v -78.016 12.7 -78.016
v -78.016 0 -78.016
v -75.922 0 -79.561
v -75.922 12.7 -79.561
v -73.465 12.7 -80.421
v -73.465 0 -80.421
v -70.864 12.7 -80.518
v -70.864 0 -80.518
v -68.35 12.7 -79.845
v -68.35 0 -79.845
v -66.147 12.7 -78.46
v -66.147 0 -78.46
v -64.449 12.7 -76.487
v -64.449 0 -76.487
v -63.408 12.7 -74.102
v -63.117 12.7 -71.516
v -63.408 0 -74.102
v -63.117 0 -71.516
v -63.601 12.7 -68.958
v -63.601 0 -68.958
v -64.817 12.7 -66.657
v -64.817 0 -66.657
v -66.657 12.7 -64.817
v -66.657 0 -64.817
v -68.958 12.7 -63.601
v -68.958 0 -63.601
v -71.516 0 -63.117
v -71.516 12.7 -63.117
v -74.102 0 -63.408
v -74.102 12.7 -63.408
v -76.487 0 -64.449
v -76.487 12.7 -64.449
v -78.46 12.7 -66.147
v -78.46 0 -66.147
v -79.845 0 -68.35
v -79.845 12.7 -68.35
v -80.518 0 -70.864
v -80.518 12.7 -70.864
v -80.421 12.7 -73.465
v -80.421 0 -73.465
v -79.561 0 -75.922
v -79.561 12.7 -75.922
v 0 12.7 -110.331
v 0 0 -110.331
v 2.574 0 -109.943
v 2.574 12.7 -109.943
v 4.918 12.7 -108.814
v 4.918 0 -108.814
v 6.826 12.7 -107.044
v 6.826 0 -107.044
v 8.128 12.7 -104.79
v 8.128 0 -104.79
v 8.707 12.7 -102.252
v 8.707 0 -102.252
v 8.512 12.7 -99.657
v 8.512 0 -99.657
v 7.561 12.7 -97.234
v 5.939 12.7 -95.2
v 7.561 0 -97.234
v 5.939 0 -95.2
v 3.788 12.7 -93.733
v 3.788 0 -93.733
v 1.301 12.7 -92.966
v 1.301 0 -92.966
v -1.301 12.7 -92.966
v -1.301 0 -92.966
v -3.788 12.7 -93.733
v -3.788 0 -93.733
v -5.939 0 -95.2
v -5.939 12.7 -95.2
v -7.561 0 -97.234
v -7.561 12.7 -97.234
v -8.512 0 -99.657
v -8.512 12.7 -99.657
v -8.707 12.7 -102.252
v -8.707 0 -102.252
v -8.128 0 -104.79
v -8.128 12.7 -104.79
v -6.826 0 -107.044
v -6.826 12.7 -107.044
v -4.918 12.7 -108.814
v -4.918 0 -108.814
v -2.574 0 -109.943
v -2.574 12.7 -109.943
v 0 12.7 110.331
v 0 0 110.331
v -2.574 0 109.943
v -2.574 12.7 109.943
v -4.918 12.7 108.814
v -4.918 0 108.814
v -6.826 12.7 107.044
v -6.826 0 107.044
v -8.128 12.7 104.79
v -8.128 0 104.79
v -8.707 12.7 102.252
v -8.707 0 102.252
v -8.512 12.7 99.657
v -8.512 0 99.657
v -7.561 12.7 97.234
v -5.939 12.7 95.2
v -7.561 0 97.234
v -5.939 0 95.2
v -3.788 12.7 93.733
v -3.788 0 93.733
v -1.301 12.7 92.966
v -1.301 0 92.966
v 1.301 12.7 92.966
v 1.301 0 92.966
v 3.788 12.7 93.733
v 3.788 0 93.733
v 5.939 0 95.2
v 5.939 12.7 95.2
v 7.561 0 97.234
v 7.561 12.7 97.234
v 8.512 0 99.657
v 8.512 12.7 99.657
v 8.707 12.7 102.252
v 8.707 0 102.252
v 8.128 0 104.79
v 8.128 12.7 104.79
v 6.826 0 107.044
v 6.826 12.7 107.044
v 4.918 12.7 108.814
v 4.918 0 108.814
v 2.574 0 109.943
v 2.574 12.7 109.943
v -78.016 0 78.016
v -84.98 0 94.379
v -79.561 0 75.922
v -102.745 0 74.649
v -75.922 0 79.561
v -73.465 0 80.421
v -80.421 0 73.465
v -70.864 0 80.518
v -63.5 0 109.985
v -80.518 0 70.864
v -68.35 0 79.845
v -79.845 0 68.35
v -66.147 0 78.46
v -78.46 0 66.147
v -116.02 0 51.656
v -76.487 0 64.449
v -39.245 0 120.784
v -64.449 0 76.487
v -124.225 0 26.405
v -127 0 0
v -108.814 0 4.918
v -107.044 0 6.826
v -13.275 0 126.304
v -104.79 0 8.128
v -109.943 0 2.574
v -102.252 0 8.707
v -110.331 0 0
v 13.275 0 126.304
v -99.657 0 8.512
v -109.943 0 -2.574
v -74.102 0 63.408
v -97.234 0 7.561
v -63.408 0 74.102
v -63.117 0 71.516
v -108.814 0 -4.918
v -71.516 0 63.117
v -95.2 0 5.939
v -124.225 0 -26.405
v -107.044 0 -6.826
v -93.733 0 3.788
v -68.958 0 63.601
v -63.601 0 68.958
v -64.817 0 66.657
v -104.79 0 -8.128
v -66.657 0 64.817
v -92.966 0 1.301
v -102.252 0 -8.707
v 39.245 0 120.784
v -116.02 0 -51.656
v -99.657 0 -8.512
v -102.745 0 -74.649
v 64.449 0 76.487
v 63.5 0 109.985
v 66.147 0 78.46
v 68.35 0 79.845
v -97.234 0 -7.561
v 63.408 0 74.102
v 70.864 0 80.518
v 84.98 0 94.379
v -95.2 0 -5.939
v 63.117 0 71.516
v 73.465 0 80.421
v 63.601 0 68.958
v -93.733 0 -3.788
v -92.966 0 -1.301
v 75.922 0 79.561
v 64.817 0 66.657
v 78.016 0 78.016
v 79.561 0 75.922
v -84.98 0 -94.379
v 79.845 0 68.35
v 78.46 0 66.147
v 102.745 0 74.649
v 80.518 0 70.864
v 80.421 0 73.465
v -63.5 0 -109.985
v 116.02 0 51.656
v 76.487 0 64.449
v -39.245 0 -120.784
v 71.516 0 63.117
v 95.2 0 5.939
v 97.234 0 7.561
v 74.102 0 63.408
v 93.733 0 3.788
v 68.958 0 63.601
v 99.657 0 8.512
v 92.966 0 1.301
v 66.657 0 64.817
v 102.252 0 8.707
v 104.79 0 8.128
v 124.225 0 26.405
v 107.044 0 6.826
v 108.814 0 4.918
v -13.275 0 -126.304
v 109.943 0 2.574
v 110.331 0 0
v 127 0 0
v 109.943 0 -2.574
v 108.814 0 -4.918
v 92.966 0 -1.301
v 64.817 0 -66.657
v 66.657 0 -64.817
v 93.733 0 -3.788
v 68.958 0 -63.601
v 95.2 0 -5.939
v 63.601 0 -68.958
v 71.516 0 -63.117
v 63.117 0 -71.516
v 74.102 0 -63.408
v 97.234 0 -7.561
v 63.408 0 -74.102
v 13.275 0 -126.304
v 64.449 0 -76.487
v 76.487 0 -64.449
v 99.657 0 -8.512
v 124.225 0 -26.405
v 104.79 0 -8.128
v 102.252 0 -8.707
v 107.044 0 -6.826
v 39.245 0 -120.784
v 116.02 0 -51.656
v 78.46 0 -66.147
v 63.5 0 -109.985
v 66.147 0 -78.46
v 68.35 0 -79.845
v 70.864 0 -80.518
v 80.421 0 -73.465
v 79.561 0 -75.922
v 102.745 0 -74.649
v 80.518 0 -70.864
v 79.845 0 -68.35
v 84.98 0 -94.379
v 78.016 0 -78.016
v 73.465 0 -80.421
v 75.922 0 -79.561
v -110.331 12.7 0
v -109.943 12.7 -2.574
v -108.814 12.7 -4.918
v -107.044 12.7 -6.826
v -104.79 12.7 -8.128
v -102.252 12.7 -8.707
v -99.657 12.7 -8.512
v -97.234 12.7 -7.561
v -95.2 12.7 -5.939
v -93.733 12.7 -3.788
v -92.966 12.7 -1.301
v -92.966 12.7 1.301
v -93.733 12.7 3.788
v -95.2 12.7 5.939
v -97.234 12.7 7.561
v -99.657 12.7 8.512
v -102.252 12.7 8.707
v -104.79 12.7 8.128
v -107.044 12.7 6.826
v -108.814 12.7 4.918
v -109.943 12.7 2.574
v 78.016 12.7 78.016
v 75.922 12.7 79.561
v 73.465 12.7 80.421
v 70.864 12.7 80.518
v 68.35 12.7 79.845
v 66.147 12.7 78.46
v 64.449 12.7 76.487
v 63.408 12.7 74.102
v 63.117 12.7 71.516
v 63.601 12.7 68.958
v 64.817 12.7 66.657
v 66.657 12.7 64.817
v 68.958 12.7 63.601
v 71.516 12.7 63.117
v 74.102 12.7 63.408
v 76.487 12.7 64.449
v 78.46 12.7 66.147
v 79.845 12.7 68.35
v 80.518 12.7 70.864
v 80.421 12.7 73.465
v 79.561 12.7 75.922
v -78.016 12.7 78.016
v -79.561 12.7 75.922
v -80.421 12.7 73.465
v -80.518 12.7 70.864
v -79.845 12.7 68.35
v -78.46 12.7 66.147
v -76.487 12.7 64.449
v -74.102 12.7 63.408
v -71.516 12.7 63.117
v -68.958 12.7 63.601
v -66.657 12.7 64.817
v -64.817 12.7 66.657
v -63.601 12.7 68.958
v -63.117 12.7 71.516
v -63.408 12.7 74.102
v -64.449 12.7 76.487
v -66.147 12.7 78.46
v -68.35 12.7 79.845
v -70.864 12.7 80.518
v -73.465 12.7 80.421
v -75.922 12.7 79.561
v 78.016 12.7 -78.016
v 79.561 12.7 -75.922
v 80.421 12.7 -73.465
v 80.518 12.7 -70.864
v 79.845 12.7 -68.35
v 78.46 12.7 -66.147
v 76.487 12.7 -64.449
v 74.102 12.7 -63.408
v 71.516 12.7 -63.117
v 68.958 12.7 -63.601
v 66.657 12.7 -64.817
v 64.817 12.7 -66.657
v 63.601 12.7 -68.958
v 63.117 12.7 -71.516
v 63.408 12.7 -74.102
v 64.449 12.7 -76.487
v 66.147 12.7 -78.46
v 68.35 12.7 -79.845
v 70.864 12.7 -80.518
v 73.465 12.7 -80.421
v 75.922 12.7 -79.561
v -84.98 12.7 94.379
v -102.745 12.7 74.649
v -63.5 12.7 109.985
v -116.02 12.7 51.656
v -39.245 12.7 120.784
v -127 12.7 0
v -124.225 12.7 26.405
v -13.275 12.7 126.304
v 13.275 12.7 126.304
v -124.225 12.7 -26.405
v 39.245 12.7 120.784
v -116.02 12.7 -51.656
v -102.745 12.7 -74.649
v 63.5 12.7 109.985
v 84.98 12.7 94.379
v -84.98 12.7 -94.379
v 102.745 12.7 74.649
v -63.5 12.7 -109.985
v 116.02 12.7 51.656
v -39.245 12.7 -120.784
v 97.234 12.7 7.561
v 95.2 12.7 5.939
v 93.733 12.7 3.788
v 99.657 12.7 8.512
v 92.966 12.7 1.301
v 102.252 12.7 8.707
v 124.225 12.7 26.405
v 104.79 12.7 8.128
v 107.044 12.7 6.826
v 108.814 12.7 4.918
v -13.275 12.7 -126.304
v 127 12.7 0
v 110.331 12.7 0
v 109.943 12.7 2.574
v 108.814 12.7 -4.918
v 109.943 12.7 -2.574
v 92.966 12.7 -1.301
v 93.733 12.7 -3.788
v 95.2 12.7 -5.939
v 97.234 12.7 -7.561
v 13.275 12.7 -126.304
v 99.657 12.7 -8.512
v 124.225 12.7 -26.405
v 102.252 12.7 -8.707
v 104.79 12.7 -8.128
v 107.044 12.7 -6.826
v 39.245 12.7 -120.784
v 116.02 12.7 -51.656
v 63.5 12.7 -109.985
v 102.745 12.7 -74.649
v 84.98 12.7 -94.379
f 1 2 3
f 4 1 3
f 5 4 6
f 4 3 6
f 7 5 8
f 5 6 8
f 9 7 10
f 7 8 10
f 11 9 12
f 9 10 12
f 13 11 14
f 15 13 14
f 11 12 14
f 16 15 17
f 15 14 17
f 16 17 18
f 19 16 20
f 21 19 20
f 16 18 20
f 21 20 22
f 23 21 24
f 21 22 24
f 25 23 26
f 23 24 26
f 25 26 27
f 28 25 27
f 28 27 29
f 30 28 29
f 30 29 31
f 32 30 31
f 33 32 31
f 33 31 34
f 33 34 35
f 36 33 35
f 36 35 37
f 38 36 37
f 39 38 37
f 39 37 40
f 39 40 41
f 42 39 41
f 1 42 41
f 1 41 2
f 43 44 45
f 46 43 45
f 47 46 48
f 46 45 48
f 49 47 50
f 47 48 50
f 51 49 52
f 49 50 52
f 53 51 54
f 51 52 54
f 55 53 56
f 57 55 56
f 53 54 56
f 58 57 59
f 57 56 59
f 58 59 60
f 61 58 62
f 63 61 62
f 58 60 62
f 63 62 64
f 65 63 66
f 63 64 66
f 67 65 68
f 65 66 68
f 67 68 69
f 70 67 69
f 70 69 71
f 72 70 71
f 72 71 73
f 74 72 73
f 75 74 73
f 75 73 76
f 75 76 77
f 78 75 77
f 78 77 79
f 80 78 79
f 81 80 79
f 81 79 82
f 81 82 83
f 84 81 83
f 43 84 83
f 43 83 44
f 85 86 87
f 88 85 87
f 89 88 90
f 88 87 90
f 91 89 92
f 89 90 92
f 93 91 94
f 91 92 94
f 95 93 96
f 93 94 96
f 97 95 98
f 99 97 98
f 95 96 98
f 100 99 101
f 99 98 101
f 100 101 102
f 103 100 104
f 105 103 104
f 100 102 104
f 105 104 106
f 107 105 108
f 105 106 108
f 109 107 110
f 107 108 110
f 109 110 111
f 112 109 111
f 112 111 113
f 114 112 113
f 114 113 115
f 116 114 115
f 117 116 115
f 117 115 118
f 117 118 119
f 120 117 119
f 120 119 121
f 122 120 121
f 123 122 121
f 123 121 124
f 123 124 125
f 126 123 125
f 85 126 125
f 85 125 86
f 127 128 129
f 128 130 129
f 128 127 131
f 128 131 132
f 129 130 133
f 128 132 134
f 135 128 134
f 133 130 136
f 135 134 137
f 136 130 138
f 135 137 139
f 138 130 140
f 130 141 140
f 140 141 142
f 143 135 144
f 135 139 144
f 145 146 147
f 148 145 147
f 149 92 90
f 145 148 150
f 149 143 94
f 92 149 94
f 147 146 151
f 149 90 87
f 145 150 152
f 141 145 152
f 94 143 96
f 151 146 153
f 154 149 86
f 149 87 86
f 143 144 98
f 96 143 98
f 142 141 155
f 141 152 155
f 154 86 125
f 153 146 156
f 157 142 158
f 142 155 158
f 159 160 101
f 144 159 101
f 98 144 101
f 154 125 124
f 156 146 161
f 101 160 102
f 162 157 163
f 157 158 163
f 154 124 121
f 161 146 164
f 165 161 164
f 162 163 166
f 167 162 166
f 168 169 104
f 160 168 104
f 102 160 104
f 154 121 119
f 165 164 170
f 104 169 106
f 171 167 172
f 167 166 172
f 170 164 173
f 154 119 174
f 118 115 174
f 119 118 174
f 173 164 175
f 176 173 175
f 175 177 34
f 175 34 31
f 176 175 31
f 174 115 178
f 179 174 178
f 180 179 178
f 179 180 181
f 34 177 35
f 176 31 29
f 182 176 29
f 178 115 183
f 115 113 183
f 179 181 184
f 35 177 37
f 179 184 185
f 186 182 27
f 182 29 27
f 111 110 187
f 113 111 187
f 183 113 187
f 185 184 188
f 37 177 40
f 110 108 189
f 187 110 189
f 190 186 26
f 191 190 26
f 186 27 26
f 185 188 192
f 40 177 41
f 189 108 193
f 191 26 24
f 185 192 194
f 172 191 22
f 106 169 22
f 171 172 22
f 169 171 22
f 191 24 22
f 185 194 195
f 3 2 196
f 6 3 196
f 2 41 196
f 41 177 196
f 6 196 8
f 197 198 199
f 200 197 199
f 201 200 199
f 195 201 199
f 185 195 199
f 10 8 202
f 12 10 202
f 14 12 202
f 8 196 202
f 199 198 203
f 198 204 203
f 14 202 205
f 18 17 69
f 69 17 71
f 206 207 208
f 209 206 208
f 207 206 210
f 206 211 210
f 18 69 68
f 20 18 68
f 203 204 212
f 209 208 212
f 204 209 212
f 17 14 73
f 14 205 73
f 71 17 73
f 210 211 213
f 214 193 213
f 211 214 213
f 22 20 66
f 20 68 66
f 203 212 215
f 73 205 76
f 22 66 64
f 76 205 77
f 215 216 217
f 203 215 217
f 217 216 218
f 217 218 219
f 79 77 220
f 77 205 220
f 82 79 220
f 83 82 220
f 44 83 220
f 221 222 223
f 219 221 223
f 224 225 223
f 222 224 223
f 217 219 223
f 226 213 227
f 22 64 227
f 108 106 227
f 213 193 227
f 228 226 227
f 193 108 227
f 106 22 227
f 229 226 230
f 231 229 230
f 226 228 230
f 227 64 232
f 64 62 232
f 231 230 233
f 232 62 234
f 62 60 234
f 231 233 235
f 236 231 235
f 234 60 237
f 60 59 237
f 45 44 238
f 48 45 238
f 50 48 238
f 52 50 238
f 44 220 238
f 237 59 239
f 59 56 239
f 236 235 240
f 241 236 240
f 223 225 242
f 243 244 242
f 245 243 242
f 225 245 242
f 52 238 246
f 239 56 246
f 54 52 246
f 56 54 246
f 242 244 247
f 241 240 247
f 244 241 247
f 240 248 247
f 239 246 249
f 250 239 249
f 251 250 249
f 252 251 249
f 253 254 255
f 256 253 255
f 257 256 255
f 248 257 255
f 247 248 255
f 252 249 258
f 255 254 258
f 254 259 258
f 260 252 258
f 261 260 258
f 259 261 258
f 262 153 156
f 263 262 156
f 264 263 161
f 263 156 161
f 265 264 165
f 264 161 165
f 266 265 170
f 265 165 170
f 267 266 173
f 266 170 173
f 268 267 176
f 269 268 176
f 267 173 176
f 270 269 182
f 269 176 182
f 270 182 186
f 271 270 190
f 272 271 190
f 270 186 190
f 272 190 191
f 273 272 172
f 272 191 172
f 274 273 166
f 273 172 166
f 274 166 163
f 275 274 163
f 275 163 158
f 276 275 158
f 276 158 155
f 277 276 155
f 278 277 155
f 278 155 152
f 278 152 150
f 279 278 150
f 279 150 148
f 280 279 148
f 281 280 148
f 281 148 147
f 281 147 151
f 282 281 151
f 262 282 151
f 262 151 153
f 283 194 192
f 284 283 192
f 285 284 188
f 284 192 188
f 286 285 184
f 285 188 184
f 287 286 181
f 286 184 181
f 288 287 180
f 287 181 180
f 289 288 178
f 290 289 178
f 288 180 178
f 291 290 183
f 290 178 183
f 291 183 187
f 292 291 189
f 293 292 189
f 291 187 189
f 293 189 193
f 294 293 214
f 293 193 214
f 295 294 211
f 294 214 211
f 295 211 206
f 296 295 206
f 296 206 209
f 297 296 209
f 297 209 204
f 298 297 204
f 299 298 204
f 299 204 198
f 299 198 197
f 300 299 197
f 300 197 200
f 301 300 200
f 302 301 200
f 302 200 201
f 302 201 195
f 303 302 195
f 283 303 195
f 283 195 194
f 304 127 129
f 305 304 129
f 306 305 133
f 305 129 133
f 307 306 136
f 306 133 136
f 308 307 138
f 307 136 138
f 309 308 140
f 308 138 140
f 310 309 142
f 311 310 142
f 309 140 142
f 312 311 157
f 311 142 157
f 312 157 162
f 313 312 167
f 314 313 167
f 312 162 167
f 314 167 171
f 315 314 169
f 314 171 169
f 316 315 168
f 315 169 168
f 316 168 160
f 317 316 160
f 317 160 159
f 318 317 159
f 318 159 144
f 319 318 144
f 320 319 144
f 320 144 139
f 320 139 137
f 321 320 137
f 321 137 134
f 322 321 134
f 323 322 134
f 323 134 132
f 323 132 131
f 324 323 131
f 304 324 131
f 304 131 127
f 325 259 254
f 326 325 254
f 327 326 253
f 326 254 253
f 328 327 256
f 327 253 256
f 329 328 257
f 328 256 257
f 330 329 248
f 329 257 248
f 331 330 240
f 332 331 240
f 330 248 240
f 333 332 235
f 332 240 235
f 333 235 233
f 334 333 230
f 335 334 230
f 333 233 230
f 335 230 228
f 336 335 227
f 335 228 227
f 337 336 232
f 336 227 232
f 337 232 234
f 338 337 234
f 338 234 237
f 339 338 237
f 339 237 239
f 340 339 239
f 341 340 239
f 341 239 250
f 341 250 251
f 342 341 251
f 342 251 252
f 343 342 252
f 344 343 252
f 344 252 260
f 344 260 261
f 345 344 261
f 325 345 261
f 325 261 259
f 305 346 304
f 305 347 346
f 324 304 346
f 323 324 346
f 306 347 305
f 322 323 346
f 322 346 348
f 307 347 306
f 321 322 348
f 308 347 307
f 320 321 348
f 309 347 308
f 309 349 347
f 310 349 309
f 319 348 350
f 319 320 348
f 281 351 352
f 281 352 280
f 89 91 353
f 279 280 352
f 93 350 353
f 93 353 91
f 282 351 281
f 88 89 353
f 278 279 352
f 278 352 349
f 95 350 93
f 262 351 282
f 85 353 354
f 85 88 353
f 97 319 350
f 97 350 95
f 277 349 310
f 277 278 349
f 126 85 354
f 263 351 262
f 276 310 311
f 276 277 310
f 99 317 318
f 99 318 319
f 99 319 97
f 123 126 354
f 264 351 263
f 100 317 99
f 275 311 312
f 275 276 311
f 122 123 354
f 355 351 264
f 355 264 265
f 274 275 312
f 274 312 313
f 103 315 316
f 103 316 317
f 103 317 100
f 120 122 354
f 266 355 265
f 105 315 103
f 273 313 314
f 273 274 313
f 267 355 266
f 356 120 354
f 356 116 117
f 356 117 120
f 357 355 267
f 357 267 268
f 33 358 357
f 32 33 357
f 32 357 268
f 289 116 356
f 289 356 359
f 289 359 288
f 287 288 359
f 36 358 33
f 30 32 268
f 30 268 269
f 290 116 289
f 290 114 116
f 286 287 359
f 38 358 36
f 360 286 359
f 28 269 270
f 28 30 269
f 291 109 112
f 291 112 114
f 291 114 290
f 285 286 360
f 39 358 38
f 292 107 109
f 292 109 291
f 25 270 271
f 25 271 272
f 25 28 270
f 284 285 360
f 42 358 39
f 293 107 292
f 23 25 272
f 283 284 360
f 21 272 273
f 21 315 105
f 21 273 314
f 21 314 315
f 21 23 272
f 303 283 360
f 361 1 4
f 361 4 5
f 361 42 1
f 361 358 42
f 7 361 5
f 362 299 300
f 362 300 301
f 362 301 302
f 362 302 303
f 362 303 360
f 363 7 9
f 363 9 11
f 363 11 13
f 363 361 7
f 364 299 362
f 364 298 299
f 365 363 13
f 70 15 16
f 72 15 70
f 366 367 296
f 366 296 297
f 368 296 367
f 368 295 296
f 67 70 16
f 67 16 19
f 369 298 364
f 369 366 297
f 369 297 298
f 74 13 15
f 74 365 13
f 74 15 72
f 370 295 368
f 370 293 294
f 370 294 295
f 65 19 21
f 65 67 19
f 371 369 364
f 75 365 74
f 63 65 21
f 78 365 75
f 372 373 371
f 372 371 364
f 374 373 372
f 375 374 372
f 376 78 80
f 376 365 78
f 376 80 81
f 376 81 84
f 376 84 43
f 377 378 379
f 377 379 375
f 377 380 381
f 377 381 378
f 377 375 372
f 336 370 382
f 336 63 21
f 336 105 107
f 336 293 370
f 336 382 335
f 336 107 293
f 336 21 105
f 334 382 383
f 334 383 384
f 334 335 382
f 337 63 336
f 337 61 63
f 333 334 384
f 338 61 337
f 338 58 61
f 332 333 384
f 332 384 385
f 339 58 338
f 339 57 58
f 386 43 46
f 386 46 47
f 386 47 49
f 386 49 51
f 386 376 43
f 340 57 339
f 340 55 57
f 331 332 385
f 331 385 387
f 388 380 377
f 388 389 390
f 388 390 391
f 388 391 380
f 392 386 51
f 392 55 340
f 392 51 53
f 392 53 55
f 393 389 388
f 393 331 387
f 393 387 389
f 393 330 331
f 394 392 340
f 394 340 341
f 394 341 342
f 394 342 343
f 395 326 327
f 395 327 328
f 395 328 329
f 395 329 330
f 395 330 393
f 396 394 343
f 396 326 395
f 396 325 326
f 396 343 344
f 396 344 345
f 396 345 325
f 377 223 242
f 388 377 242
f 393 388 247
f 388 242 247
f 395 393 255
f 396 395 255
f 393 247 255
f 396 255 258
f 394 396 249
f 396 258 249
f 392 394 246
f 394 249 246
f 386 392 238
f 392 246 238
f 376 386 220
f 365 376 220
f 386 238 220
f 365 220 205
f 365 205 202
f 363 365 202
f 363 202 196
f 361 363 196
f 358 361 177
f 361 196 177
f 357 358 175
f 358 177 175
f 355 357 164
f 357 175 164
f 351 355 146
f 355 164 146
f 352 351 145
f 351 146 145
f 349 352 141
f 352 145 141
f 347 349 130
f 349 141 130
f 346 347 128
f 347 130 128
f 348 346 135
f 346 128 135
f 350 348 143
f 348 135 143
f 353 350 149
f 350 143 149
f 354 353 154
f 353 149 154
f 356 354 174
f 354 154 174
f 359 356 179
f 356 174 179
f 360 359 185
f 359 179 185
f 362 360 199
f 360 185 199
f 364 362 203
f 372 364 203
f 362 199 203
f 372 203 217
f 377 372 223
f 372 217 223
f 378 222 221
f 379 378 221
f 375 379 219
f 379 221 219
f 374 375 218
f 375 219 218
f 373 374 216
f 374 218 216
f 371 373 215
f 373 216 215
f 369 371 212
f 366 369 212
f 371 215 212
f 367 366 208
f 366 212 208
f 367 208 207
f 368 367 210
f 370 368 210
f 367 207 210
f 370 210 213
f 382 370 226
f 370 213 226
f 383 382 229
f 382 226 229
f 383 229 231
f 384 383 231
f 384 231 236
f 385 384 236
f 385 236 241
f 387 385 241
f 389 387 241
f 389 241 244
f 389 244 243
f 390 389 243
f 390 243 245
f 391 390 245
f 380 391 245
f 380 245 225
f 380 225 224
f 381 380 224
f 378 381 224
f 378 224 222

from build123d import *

# Parameters (mm, degrees)
SKETCH2_R                       = 127
EXTRUDE1_DEPTH                  = 12.7
F_11_16_0_6875_DIAMETER_HOLE1_D = 17.4625
CIRPATTERN1_COUNT               = 8


with BuildPart() as part:
    # Sketch2 → Extrude1 (new body)
    with BuildSketch(Plane(origin=(0, 0, 0), x_dir=(1, 0, 0), z_dir=(0, 1, 0))):
        Circle(SKETCH2_R)
    extrude(amount=EXTRUDE1_DEPTH)

    # 11/16 (0.6875) Diameter Hole1 (through all)
    with Locations(Plane(origin=(0, 12.7, 0), x_dir=(-1, 0, 0), z_dir=(0, 1, 0))):
        with Locations((-101.6, 0)):
            f_11_16_0_6875_diameter_hole1 = Hole(F_11_16_0_6875_DIAMETER_HOLE1_D / 2)

    # CirPattern1: 11/16 (0.6875) Diameter Hole1 ×8 about axis
    cirpattern1_axis = Axis((0, 12.7, 0), (0, -1, 0))
    for i in range(1, CIRPATTERN1_COUNT):
        add(f_11_16_0_6875_diameter_hole1.rotate(cirpattern1_axis, i * 360 / CIRPATTERN1_COUNT), mode=Mode.SUBTRACT)


solid = part.part
